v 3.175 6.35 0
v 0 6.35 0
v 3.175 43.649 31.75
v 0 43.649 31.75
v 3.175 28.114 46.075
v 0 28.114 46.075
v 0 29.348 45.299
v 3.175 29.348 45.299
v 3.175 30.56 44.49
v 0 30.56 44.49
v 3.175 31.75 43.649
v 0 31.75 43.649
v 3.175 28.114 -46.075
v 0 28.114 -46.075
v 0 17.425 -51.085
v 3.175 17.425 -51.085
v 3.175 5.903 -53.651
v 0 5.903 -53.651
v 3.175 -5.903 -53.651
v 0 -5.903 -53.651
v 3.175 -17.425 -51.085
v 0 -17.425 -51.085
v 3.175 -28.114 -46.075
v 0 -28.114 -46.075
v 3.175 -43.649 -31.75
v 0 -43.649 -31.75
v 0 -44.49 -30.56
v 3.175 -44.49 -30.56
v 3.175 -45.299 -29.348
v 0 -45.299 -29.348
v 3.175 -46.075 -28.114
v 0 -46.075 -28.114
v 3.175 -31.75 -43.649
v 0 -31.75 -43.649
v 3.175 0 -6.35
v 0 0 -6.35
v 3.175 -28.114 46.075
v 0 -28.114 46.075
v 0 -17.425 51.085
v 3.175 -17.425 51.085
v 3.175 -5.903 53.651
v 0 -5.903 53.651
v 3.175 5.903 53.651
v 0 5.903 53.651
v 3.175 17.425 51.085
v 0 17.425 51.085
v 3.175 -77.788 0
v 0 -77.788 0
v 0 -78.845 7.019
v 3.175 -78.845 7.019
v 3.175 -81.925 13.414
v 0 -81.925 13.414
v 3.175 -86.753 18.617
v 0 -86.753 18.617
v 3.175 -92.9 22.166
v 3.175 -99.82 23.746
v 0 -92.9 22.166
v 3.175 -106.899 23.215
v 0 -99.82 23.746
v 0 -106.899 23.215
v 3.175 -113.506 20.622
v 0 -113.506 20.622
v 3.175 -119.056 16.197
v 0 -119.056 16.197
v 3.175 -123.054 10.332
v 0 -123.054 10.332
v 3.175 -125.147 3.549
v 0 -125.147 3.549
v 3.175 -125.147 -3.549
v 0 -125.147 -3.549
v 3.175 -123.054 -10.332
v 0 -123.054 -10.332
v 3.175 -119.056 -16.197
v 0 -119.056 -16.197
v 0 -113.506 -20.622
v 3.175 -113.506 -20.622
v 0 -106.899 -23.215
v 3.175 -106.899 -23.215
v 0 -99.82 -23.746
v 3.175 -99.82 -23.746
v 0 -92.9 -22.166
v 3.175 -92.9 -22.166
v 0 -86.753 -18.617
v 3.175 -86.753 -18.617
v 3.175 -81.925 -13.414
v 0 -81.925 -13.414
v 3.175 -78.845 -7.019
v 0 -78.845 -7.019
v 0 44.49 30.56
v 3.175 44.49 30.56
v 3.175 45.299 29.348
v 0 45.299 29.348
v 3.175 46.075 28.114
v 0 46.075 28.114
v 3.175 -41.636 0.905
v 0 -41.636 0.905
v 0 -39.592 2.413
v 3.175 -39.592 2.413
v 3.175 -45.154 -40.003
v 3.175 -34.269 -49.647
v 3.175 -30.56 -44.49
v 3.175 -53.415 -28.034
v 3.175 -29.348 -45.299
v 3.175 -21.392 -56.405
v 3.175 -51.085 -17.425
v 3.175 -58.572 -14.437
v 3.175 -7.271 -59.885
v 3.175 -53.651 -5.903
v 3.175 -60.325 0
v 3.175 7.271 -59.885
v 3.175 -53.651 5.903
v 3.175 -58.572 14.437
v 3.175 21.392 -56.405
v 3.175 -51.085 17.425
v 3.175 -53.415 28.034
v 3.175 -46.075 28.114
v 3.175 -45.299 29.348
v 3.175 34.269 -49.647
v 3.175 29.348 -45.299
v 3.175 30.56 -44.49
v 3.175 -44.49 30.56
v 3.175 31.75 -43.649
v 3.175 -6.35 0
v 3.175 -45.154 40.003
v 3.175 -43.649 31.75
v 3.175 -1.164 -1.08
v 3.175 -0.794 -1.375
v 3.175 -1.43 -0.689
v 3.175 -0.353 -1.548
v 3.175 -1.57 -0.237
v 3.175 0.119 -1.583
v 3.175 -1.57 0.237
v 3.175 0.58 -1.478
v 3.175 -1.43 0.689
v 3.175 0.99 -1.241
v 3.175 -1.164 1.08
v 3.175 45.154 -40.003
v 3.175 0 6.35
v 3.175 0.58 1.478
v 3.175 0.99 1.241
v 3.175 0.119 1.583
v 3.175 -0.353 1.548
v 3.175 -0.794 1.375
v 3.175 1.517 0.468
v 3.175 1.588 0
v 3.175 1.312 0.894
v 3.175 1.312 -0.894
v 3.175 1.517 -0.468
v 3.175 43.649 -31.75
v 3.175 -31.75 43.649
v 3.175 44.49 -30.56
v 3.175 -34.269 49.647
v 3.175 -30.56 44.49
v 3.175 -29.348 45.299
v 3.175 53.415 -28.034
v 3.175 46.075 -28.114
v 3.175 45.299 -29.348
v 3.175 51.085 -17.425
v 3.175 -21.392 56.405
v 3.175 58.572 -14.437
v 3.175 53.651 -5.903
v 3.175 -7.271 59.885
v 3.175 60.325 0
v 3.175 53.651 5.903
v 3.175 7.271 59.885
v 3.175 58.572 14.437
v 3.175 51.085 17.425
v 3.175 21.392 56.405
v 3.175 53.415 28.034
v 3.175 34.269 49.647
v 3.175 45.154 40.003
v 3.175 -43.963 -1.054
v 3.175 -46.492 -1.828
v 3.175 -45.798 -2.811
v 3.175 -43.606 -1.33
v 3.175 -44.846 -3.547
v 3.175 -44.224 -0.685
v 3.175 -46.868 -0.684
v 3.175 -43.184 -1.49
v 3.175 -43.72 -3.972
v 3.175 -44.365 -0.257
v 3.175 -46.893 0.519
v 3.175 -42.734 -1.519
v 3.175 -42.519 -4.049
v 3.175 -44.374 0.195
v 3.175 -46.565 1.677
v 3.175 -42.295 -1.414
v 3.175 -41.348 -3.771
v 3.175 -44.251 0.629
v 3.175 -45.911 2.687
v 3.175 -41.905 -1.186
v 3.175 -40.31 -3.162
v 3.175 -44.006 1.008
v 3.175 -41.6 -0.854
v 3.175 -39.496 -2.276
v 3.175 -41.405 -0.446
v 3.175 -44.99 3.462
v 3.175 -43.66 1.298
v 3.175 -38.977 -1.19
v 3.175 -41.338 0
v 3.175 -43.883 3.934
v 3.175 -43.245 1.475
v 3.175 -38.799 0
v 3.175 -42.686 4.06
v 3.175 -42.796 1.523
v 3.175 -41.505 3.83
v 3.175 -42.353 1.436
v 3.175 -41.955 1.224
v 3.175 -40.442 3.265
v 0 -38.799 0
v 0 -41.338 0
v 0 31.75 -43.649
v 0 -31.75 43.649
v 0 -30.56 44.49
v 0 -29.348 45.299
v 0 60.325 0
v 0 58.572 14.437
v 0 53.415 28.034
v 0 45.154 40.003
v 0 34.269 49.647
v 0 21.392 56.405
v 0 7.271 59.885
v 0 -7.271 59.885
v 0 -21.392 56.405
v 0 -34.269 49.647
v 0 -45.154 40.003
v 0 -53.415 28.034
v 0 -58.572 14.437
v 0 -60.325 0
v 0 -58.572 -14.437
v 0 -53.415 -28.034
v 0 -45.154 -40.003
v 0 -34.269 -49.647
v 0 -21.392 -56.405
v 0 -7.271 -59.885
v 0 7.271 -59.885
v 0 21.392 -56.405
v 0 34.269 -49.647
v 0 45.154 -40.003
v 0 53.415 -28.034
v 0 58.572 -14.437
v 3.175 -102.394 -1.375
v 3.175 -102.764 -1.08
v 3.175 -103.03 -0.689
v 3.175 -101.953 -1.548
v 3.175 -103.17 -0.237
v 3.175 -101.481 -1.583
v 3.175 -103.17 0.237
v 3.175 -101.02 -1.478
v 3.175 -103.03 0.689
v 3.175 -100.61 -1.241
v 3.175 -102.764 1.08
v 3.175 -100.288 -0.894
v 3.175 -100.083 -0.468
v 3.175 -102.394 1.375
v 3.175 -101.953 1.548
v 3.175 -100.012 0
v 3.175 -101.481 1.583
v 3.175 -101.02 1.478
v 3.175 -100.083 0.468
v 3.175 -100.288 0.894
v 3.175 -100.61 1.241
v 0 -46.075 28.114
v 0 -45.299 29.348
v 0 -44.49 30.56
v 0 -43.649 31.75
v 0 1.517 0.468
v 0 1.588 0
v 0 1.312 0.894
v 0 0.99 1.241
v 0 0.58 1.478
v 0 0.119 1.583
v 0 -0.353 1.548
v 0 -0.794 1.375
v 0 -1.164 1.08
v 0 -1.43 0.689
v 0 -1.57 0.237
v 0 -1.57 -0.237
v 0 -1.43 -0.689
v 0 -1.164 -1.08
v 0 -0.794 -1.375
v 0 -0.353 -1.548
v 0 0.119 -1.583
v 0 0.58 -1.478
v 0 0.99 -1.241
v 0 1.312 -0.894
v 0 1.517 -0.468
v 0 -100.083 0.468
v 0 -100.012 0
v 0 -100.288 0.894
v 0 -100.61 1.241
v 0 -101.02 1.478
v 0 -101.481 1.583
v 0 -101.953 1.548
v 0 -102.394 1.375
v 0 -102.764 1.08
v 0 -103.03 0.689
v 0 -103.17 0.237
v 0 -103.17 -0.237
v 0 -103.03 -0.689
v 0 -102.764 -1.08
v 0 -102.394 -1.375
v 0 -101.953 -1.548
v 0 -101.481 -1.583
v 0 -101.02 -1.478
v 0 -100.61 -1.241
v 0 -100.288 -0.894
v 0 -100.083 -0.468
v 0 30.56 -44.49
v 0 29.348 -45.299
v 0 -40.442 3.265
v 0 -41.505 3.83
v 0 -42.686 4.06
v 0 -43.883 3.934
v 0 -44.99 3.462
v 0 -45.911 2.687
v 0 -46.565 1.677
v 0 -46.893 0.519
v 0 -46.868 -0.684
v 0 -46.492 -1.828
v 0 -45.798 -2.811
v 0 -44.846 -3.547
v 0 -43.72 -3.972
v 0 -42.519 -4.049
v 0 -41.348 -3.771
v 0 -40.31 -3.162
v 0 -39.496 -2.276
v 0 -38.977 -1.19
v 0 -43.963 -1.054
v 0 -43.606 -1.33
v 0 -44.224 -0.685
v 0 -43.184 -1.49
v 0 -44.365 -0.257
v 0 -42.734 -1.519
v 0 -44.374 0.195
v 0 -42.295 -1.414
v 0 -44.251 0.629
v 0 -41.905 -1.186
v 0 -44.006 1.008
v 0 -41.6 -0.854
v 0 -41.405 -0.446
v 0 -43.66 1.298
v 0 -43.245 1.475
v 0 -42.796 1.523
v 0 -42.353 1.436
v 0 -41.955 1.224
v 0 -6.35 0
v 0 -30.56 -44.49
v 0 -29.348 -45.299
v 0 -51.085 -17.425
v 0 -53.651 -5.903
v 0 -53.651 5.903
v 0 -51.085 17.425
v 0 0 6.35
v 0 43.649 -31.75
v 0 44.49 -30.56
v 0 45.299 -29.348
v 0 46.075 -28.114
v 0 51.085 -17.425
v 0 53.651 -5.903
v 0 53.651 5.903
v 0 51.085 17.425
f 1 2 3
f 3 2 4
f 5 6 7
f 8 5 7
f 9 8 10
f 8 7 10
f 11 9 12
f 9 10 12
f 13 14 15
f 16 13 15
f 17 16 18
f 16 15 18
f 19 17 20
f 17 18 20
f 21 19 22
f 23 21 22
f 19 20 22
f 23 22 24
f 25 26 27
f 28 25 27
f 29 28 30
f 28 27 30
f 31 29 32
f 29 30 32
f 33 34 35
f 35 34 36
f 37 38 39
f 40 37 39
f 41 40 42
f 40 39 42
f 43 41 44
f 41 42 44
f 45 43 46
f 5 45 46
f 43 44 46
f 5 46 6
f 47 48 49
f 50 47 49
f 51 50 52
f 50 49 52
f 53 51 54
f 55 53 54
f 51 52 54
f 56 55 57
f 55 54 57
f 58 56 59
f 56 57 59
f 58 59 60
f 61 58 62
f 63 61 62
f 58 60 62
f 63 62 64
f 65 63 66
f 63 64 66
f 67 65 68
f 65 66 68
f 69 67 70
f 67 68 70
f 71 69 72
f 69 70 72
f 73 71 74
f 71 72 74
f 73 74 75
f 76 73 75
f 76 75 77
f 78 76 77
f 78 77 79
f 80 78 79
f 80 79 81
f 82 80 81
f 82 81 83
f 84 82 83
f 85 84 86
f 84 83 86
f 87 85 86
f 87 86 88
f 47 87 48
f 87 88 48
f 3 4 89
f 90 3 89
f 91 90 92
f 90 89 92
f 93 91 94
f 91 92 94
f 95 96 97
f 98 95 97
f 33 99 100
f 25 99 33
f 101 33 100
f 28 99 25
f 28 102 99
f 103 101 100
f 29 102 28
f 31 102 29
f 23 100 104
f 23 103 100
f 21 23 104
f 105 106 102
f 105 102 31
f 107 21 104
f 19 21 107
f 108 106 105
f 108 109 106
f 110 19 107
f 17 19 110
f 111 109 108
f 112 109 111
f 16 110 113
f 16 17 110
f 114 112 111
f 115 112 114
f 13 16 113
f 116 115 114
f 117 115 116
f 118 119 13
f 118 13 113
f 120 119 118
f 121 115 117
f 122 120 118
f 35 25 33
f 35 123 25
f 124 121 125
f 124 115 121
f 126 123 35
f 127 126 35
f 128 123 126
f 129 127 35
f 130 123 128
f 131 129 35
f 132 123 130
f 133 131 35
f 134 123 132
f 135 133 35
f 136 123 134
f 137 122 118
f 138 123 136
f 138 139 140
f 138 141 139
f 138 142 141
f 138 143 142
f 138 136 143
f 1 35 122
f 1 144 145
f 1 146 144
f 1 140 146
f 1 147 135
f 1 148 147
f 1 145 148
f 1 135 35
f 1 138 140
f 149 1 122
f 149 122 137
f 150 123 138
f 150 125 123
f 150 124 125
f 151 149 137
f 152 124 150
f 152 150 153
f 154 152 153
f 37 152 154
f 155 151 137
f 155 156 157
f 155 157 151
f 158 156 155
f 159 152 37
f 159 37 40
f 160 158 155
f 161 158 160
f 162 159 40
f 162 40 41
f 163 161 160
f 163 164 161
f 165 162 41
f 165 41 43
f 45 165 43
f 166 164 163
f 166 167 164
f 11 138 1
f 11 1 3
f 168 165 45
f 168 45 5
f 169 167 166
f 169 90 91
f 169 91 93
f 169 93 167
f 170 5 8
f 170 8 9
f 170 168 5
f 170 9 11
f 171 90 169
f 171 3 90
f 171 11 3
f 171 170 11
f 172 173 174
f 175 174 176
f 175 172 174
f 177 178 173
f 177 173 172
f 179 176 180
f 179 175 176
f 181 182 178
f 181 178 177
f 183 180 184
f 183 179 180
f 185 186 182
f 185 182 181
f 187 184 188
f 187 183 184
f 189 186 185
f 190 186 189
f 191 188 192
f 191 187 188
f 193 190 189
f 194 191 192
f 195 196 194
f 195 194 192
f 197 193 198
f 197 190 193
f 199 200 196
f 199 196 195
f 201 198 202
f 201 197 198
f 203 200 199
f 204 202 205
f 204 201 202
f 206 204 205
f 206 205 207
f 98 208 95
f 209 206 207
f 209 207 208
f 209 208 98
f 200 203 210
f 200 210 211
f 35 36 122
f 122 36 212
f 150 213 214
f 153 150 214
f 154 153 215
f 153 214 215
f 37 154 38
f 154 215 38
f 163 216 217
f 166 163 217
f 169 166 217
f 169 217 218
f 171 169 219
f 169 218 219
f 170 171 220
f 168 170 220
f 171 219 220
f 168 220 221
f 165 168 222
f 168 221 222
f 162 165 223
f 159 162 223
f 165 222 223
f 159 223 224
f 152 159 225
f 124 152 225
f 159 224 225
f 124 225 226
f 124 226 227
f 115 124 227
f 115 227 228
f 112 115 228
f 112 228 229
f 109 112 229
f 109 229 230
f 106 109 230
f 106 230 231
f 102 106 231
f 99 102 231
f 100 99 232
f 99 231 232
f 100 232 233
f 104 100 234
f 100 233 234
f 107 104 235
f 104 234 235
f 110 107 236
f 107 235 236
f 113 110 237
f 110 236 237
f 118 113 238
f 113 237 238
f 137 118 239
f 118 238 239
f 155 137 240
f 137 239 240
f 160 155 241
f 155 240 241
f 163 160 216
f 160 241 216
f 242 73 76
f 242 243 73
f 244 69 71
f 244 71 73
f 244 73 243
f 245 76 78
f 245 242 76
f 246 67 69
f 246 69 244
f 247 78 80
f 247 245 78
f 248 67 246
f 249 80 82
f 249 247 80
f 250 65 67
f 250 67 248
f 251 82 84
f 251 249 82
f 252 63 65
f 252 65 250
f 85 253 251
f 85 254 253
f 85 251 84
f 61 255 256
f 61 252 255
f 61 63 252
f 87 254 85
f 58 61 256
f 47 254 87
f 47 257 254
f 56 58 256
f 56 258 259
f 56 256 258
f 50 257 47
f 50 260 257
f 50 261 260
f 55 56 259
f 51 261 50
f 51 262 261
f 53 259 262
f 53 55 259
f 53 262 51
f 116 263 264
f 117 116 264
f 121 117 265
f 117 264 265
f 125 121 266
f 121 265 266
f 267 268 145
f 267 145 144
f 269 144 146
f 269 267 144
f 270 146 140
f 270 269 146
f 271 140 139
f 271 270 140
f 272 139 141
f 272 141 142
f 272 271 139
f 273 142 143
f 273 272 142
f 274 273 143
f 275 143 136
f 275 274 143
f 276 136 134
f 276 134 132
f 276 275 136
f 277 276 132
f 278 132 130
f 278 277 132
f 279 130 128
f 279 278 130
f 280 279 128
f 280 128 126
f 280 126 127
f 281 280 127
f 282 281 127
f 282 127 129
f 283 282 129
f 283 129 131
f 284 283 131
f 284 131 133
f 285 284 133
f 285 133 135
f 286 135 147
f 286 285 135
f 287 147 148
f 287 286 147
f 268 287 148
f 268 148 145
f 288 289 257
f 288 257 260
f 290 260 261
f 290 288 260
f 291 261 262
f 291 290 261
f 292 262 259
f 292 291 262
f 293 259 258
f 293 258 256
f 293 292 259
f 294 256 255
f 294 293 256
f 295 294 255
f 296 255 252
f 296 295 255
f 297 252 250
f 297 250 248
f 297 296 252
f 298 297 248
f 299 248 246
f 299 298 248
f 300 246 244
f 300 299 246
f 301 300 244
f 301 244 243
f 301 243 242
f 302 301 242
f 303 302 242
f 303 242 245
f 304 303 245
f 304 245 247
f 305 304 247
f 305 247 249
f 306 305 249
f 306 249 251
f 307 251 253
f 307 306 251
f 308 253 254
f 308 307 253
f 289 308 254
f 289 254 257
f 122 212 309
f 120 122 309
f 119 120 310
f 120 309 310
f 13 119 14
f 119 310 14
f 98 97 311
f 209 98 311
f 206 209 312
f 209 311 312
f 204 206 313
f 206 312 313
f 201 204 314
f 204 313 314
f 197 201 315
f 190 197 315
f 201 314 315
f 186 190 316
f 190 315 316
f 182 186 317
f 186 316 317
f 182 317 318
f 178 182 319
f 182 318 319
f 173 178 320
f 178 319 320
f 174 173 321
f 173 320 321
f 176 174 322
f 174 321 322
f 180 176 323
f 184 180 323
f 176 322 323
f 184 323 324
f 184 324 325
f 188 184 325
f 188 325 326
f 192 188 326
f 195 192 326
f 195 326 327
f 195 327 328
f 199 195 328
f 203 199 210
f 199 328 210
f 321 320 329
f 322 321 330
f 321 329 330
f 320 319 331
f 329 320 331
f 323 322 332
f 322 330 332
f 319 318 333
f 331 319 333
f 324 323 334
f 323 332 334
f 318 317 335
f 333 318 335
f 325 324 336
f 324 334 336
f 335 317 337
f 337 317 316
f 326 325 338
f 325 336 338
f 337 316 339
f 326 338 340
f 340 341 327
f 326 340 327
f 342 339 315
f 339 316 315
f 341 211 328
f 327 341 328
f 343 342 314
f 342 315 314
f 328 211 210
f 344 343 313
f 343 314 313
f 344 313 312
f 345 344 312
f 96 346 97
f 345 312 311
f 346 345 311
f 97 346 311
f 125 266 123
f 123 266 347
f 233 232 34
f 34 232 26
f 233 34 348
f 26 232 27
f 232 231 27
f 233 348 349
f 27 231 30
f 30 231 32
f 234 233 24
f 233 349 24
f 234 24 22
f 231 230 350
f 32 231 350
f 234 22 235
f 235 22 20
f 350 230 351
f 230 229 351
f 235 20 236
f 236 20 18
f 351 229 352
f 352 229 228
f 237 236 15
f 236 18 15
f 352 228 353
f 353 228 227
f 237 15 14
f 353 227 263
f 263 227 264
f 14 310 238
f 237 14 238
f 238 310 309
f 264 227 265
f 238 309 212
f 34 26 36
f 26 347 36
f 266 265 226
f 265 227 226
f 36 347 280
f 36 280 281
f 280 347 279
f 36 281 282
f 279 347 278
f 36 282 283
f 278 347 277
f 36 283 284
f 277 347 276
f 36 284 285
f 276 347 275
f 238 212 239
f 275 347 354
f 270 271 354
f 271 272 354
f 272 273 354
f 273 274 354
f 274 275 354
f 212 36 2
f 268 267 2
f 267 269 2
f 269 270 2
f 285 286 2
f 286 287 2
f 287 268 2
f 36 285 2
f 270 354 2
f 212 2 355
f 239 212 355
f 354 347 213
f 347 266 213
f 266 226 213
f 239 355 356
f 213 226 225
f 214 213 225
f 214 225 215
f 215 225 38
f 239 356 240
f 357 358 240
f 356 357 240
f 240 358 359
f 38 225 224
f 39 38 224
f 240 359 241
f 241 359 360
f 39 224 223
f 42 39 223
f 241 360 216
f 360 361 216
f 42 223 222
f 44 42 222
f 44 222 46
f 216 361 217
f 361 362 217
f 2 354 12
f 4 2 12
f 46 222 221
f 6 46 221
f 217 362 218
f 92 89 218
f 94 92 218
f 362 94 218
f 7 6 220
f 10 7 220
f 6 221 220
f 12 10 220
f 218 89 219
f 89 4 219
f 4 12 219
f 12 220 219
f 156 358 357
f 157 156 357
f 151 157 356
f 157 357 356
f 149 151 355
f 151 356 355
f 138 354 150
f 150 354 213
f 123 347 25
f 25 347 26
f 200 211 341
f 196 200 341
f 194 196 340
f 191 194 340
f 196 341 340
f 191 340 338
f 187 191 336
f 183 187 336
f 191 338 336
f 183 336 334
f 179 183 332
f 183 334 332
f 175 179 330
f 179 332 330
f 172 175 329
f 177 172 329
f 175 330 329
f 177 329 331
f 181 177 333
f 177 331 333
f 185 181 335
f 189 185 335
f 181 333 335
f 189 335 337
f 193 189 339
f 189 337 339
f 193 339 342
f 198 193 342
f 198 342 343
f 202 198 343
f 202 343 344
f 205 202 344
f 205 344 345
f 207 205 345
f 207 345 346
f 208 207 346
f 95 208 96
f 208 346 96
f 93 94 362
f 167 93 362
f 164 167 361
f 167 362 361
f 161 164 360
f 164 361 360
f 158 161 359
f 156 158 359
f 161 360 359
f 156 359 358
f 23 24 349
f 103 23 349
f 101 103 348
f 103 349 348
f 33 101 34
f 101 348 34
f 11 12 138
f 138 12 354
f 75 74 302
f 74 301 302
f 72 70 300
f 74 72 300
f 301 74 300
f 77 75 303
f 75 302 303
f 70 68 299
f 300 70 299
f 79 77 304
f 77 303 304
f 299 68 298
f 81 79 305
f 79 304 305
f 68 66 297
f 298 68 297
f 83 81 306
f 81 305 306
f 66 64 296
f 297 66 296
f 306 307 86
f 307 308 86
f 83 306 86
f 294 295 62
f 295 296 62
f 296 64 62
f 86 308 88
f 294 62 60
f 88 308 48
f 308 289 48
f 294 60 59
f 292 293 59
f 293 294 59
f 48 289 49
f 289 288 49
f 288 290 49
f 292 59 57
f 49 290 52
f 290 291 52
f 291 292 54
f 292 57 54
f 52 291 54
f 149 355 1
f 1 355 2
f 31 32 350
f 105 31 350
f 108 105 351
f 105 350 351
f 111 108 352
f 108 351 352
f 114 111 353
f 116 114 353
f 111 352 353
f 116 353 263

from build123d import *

# Parameters (mm, degrees)
F0_R     = 60.325
F0_R_2   = 1.5875
F1_DEPTH = 3.175
F2_R     = 23.8125
F2_R_2   = 1.5875
F3_DEPTH = 3.175
F5_DEPTH = 3.175


with BuildPart() as f1:
    # F0 (on Right) → F1 (new body)
    with BuildSketch(Plane.YZ):
        Circle(F0_R)
        with BuildLine():
            ThreePointArc((-43.649033, 31.75), (-38.166089, 38.166089), (-31.75, 43.649033))
            ThreePointArc((-31.75, 43.649033), (-29.956708, 44.898733), (-28.114289, 46.074802))
            ThreePointArc((-28.114289, 46.074802), (0, 53.975), (28.114289, 46.074802))
            ThreePointArc((28.114289, 46.074802), (29.956708, 44.898733), (31.75, 43.649033))
            ThreePointArc((31.75, 43.649033), (38.166089, 38.166089), (43.649033, 31.75))
            ThreePointArc((43.649033, 31.75), (44.898733, 29.956708), (46.074802, 28.114289))
            ThreePointArc((46.074802, 28.114289), (53.975, 0), (46.074802, -28.114289))
            ThreePointArc((46.074802, -28.114289), (44.898733, -29.956708), (43.649033, -31.75))
            ThreePointArc((43.649033, -31.75), (38.166089, -38.166089), (31.75, -43.649033))
            ThreePointArc((31.75, -43.649033), (29.956708, -44.898733), (28.114289, -46.074802))
            ThreePointArc((28.114289, -46.074802), (0, -53.975), (-28.114289, -46.074802))
            ThreePointArc((-28.114289, -46.074802), (-29.956708, -44.898733), (-31.75, -43.649033))
            ThreePointArc((-31.75, -43.649033), (-38.166089, -38.166089), (-43.649033, -31.75))
            ThreePointArc((-43.649033, -31.75), (-44.898733, -29.956708), (-46.074802, -28.114289))
            ThreePointArc((-46.074802, -28.114289), (-53.975, 0), (-46.074802, 28.114289))
            ThreePointArc((-46.074802, 28.114289), (-44.898733, 29.956708), (-43.649033, 31.75))
        make_face(mode=Mode.SUBTRACT)
        with BuildLine():
            Line((0, 6.35), (-31.75, 43.649033))
            ThreePointArc((-31.75, 43.649033), (-38.166089, 38.166089), (-43.649033, 31.75))
            Line((-43.649033, 31.75), (-6.35, 0))
            Line((-6.35, 0), (-43.649033, -31.75))
            ThreePointArc((-43.649033, -31.75), (-38.166089, -38.166089), (-31.75, -43.649033))
            Line((-31.75, -43.649033), (0, -6.35))
            Line((0, -6.35), (31.75, -43.649033))
            ThreePointArc((31.75, -43.649033), (38.166089, -38.166089), (43.649033, -31.75))
            Line((43.649033, -31.75), (6.35, 0))
            Line((6.35, 0), (43.649033, 31.75))
            ThreePointArc((43.649033, 31.75), (38.166089, 38.166089), (31.75, 43.649033))
            Line((31.75, 43.649033), (0, 6.35))
        make_face()
        Circle(F0_R_2, mode=Mode.SUBTRACT)
    extrude(amount=F1_DEPTH)


with BuildPart() as f3:
    # F2 (on Right) → F3 (new body)
    with BuildSketch(Plane.YZ):
        with Locations((-101.6, 0)):
            Circle(F2_R)
        with Locations((-101.6, 0)):
            Circle(F2_R_2, mode=Mode.SUBTRACT)
    extrude(amount=F3_DEPTH)


with BuildPart() as f5:
    # F4 (on Right) → F5 (new body)
    with BuildSketch(Plane.YZ):
        with BuildLine():
            Line((-38.7985, 0), (-41.3385, 0))
            ThreePointArc((-41.3385, 0), (-44.310175, -0.47625), (-41.636156, 0.904797))
            Line((-41.636156, 0.904797), (-39.59225, 2.412791))
            ThreePointArc((-39.59225, 2.412791), (-46.722966, -1.27), (-38.7985, 0))
        make_face()
    extrude(amount=F5_DEPTH)


solid = Compound([f1.part, f3.part, f5.part])
